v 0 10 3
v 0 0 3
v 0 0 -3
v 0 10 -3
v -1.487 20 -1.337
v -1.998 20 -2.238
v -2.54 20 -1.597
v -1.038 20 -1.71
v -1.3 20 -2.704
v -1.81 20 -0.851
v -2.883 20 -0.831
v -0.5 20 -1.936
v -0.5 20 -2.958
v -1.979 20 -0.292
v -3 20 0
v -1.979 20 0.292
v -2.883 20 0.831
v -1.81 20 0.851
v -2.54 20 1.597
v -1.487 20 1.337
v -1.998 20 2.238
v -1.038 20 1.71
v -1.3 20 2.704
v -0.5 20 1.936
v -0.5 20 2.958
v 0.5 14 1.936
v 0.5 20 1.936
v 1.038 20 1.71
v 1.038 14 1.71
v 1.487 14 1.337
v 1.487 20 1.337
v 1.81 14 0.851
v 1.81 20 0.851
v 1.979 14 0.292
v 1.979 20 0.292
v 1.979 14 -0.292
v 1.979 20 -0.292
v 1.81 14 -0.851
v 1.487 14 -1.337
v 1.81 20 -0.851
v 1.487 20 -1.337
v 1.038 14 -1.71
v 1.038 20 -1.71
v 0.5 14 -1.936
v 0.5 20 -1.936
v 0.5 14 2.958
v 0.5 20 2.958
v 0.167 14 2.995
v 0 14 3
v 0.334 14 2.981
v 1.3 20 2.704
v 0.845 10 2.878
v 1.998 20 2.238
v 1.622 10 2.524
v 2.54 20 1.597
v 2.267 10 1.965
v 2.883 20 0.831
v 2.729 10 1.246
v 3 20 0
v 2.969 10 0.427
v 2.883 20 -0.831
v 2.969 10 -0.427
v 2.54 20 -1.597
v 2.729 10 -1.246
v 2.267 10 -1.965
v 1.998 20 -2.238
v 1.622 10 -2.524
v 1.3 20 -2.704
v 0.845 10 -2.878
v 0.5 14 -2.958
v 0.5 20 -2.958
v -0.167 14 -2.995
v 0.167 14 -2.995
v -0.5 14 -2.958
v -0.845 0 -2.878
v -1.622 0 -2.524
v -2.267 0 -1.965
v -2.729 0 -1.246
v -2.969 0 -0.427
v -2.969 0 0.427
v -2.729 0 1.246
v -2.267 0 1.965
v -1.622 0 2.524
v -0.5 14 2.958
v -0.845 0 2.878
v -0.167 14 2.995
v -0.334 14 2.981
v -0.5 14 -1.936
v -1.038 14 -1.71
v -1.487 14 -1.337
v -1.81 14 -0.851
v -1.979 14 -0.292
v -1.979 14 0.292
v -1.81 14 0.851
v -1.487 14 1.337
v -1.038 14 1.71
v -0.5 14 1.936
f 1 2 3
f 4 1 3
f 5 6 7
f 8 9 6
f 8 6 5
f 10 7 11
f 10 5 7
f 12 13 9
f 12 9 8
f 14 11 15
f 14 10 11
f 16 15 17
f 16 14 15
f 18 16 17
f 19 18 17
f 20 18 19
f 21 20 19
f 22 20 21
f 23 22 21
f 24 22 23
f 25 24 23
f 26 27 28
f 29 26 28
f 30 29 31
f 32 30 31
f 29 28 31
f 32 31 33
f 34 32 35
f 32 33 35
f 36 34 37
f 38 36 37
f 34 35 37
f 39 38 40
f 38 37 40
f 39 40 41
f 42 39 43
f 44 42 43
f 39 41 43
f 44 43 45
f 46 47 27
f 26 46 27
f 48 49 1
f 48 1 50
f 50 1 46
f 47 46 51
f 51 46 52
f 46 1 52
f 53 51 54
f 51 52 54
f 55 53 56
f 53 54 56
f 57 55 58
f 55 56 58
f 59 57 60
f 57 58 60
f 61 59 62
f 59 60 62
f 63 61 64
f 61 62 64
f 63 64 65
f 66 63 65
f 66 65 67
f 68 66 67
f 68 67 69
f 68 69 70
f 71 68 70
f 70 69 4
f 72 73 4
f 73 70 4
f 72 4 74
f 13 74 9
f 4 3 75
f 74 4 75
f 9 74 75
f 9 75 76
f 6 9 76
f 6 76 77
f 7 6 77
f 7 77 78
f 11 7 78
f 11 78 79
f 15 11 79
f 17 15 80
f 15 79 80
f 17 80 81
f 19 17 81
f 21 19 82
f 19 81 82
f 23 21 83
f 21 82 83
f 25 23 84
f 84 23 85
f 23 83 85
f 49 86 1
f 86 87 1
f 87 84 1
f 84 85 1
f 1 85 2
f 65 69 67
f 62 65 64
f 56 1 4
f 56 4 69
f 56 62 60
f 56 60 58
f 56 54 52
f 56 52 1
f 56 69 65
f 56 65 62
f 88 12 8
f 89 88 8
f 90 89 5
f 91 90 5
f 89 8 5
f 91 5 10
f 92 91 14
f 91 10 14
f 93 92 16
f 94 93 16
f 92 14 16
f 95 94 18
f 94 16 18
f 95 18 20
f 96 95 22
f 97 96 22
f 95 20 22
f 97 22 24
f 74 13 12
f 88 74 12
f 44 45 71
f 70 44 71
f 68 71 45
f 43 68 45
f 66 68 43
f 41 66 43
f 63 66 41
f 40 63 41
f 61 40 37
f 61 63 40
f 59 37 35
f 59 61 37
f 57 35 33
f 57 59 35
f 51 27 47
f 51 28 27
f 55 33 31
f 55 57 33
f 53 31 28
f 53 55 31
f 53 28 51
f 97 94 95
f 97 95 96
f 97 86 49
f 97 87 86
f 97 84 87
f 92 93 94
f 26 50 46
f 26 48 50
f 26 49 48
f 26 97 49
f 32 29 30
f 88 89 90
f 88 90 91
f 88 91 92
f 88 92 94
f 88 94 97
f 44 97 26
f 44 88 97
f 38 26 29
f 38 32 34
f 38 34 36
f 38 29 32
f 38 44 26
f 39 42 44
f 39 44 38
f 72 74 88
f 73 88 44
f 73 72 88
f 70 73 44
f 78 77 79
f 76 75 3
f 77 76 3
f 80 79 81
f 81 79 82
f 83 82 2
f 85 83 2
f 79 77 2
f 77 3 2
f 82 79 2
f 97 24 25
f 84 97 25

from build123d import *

# Parameters (mm, degrees)
SKETCH1_R           = 3
BOSS_EXTRUDE1_DEPTH = 20
CUT_EXTRUDE1_DEPTH  = 10
CUT_EXTRUDE2_DEPTH  = 6


with BuildPart() as part:
    # Sketch1 → Boss-Extrude1 (new body)
    with BuildSketch(Plane(origin=(0, 0, 0), x_dir=(1, 0, 0), z_dir=(0, 1, 0))):
        with Locations(Location((0, 0, 0), (0, 0, 270))):
            Circle(SKETCH1_R)
    extrude(amount=BOSS_EXTRUDE1_DEPTH)

    # Sketch2 → Cut-Extrude1 (cut)
    with BuildSketch(Plane.XZ):
        with BuildLine():
            Line((0, 3), (0, -3))
            ThreePointArc((0, -3), (3, 0), (0, 3))
        make_face()
    extrude(amount=-CUT_EXTRUDE1_DEPTH, mode=Mode.SUBTRACT)

    # Sketch3 → Cut-Extrude2 (cut)
    with BuildSketch(Plane(origin=(0, 20, 0), x_dir=(1, 0, 0), z_dir=(0, 1, 0))):
        with BuildLine():
            Line((-0.5, -1.936491673), (-0.5, -3.922731478))
            Line((-0.5, -3.922731478), (0.5, -3.922731478))
            Line((0.5, -3.922731478), (0.5, -1.936491673))
            ThreePointArc((0.5, -1.936491673), (2, 0), (0.5, 1.936491673))
            Line((0.5, 1.936491673), (0.5, 3.922731478))
            Line((0.5, 3.922731478), (-0.5, 3.922731478))
            Line((-0.5, 3.922731478), (-0.5, 1.936491673))
            ThreePointArc((-0.5, 1.936491673), (-2, 0), (-0.5, -1.936491673))
        make_face()
    extrude(amount=-CUT_EXTRUDE2_DEPTH, mode=Mode.SUBTRACT)


solid = part.part
